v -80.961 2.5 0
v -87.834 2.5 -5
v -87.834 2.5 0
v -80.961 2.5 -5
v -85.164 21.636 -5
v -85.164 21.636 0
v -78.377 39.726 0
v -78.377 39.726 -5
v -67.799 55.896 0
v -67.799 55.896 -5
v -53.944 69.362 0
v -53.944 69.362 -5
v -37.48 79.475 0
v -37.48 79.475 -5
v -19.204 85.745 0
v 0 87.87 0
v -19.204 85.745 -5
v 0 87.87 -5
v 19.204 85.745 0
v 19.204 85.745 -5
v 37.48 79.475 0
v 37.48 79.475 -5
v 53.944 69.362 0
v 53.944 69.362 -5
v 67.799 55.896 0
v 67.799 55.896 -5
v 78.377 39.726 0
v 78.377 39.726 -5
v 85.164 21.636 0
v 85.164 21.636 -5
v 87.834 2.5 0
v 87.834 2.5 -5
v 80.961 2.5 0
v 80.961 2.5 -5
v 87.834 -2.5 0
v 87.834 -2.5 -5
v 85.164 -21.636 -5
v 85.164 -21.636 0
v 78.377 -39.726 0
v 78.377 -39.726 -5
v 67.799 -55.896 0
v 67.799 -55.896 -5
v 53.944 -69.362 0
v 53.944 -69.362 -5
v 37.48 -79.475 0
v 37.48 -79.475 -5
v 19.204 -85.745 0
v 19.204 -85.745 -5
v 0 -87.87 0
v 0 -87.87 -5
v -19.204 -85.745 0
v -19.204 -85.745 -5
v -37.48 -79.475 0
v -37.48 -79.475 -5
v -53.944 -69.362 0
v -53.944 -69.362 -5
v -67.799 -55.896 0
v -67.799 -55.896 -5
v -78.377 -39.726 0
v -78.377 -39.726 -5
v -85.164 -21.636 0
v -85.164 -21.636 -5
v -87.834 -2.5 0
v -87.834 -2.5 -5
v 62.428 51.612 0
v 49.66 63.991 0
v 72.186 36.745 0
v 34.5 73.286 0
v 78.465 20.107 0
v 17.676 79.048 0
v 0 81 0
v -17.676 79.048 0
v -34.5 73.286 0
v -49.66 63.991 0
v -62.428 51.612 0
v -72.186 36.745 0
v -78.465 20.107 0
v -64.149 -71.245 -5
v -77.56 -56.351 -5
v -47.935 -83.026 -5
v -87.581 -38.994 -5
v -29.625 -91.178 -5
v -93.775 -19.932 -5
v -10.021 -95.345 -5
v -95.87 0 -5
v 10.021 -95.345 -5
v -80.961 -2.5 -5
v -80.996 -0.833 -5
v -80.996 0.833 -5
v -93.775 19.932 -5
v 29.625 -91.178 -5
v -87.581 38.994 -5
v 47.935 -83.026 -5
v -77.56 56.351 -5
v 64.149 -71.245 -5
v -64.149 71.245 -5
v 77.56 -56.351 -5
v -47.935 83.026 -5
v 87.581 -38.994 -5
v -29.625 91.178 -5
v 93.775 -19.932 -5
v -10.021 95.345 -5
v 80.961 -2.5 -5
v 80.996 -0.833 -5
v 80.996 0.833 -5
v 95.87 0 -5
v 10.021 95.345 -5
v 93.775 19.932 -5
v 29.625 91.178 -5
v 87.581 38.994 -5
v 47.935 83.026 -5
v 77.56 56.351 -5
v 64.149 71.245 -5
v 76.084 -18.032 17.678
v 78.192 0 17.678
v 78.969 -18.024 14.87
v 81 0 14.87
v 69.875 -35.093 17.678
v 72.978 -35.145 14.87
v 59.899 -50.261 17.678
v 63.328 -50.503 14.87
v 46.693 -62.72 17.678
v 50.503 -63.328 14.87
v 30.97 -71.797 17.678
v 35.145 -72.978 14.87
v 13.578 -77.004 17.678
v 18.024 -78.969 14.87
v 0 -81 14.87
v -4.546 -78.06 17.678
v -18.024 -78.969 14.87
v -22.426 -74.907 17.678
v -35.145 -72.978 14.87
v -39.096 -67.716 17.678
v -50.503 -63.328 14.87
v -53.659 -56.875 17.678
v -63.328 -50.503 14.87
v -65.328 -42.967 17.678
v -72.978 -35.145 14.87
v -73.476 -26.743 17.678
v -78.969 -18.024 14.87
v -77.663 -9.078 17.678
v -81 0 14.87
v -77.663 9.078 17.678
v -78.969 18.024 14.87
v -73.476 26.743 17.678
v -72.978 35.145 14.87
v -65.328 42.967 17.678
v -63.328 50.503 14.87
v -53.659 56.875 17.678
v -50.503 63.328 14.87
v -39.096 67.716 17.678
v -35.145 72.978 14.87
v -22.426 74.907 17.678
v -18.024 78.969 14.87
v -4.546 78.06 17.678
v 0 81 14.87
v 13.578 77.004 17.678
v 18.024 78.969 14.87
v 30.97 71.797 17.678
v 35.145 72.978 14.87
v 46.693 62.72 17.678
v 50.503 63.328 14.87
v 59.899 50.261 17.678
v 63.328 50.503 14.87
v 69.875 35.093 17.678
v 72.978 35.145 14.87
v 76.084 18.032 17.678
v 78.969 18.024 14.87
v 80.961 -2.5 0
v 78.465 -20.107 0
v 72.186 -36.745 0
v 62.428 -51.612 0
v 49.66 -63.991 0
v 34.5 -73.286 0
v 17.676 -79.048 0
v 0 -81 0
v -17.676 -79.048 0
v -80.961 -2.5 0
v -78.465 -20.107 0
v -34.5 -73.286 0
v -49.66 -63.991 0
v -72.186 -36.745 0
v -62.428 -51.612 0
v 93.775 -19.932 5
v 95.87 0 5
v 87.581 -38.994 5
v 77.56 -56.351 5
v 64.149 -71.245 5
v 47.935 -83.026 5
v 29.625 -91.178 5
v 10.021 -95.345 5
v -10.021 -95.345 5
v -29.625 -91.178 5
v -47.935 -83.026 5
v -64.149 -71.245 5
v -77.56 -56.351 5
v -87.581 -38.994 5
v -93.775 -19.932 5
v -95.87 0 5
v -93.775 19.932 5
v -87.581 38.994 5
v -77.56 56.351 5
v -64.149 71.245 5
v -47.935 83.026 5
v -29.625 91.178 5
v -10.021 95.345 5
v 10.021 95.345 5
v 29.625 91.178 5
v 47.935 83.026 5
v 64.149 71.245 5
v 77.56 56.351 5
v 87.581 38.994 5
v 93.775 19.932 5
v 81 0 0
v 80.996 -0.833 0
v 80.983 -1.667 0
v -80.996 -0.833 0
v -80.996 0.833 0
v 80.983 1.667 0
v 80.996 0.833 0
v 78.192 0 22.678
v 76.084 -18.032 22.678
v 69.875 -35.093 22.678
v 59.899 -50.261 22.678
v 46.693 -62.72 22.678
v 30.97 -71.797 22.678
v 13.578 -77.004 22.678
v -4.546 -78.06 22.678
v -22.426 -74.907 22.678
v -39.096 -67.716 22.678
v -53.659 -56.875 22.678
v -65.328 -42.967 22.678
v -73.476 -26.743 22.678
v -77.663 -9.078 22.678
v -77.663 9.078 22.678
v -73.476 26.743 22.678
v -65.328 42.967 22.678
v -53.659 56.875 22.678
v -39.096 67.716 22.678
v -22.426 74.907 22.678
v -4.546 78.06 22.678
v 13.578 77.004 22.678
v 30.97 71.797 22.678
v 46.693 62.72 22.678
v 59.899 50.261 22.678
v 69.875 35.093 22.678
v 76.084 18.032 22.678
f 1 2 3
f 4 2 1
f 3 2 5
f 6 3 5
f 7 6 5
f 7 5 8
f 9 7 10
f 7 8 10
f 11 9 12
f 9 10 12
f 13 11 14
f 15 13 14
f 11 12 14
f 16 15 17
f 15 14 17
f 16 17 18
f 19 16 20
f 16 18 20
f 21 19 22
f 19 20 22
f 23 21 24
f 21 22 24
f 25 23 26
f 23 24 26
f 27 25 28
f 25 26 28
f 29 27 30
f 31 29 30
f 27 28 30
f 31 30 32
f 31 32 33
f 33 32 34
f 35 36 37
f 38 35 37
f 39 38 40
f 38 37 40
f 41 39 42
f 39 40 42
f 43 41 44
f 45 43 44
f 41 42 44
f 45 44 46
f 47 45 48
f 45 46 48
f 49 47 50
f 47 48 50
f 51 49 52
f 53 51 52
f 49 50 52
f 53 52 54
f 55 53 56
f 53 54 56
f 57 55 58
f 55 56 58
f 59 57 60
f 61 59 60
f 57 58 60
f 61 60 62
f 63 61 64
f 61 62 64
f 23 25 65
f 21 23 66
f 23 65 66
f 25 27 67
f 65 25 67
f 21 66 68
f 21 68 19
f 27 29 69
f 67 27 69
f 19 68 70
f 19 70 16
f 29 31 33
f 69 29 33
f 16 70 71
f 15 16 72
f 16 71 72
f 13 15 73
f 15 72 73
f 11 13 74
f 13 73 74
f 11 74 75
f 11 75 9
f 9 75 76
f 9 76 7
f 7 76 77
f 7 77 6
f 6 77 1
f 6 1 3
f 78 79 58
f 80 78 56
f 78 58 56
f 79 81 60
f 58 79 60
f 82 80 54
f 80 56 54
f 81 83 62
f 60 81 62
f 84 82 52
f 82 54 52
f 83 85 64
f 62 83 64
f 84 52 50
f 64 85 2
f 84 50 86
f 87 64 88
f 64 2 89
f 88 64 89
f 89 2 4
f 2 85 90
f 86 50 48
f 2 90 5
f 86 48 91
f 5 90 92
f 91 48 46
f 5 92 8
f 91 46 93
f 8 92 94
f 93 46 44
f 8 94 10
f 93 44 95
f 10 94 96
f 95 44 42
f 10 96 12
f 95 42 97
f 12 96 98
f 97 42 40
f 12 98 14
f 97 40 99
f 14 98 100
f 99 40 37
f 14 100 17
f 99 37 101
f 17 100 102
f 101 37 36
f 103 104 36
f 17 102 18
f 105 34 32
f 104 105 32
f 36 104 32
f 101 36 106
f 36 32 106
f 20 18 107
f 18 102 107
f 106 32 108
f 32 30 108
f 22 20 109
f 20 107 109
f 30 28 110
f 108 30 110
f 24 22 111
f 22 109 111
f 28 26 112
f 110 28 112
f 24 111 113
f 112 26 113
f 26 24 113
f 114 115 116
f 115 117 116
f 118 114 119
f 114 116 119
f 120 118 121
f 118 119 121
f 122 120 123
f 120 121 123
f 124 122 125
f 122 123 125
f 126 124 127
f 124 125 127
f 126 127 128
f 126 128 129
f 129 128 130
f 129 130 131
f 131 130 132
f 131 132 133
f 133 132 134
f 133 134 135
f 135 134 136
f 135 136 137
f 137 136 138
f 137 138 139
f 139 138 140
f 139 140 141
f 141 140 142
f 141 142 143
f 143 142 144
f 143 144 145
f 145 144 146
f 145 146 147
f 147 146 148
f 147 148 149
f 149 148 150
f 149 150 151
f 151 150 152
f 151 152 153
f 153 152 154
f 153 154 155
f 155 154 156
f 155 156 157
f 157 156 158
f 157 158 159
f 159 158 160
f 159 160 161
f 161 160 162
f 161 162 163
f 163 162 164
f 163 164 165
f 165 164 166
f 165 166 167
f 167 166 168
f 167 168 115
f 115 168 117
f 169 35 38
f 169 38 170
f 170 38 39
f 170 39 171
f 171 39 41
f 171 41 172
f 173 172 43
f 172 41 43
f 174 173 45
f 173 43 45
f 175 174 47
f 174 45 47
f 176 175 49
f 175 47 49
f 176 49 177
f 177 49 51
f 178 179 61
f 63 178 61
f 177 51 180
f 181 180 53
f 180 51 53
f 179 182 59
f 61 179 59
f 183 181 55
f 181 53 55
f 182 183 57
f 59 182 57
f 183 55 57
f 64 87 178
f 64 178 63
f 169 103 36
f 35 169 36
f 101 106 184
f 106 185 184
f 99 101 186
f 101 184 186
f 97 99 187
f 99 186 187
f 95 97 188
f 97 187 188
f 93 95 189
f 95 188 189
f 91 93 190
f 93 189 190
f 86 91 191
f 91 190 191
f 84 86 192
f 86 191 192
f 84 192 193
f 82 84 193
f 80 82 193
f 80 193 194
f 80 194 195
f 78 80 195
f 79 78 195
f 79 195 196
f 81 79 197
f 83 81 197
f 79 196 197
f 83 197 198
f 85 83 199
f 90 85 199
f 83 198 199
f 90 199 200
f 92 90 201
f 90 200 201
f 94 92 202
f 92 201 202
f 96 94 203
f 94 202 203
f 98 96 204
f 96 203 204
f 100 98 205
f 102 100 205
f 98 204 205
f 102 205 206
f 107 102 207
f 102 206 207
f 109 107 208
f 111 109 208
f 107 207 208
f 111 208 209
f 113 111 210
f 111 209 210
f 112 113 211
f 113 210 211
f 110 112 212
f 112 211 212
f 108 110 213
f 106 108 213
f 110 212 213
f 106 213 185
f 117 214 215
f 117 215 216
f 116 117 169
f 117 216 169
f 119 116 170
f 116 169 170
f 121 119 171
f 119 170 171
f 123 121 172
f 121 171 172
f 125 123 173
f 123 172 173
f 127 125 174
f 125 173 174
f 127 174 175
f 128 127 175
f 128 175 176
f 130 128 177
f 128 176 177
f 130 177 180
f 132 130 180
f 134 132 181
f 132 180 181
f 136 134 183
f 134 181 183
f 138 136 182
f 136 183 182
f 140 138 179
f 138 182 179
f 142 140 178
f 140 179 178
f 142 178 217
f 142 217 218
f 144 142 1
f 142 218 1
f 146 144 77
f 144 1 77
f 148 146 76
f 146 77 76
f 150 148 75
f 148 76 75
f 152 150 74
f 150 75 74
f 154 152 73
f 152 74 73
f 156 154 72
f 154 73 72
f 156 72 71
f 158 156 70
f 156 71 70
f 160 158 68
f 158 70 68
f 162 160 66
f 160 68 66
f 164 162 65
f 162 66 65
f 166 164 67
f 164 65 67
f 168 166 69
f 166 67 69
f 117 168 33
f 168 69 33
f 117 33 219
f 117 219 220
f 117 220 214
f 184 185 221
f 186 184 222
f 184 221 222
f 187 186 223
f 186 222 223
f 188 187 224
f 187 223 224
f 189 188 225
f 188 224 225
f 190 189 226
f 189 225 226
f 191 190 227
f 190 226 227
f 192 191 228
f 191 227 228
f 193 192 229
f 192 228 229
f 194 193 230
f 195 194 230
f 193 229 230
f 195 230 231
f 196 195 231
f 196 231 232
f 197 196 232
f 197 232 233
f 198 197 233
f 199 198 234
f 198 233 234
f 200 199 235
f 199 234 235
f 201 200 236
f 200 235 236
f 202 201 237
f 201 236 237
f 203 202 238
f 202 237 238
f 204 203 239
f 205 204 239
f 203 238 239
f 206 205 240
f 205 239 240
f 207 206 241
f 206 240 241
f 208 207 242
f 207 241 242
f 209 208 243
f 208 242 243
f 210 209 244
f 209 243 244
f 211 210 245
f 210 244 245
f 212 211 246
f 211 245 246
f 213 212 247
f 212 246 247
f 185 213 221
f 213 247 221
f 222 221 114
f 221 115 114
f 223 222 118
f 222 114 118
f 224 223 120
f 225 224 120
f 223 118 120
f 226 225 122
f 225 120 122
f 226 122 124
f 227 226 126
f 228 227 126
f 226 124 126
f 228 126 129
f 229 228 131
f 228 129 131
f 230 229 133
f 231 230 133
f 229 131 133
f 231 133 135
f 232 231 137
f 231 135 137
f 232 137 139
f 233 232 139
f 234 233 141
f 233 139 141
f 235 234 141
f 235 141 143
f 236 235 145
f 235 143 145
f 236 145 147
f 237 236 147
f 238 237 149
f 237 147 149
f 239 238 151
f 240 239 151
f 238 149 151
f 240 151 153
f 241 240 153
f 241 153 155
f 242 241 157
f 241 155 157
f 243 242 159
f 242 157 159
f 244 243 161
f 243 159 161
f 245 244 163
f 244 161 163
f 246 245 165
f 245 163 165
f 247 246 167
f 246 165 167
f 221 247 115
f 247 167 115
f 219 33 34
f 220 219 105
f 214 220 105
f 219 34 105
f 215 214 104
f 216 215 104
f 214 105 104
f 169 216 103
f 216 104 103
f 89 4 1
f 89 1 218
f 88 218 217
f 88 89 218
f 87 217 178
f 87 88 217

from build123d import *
from build123d.topology import SkipClean

# Parameters (mm, degrees)
BOSS_EXTRU_1_START = 5
BOSS_EXTRU_1_DEPTH = 5


with BuildPart() as part:
    # Esquisse1 → Révolution1 (revolve)
    with BuildSketch(Plane(origin=(0, 0, 0), x_dir=(1, 0, 0), z_dir=(0, 1, 0)), mode=Mode.PRIVATE) as r_volution1_sk:
        Polygon((-95.869703244, 5), (-95.869703244, -5), (-78.192033714, -22.67766953), (-78.192033714, -17.67766953), (-81, -14.869703244), (-81, 0), (-87.869703244, 0), (-87.869703244, 5), align=None)
    revolve(r_volution1_sk.sketch.rotate(Axis((0, 0, 0), (0, 0, -1)), 180), axis=Axis((0, 0, 0), (0, 0, -1)))

    # Esquisse6 → Boss.-Extru.1 (add)
    with SkipClean():  # the faces are left unmerged after this step: merging them gives an invalid solid
        with BuildSketch(Plane(origin=(0, 0, 0), x_dir=(-1, 0, 0), z_dir=(0, 0, -1)).offset(BOSS_EXTRU_1_START)):
            with BuildLine():
                Line((80.961410561, -2.5), (87.834132022, -2.5))
                ThreePointArc((87.834132022, -2.5), (87.869703244, 0), (87.834132022, 2.5))
                Line((87.834132022, 2.5), (80.961410561, 2.5))
                ThreePointArc((80.961410561, 2.5), (81, 0), (80.961410561, -2.5))
            make_face()
        boss_extru_1 = extrude(amount=-BOSS_EXTRU_1_DEPTH)

    # Symétrie1: Boss.-Extru.1 across plane
    add(boss_extru_1.mirror(Plane(origin=(0, 0, 0), x_dir=(0, 0, 1), z_dir=(1, 0, 0))))


solid = part.part
